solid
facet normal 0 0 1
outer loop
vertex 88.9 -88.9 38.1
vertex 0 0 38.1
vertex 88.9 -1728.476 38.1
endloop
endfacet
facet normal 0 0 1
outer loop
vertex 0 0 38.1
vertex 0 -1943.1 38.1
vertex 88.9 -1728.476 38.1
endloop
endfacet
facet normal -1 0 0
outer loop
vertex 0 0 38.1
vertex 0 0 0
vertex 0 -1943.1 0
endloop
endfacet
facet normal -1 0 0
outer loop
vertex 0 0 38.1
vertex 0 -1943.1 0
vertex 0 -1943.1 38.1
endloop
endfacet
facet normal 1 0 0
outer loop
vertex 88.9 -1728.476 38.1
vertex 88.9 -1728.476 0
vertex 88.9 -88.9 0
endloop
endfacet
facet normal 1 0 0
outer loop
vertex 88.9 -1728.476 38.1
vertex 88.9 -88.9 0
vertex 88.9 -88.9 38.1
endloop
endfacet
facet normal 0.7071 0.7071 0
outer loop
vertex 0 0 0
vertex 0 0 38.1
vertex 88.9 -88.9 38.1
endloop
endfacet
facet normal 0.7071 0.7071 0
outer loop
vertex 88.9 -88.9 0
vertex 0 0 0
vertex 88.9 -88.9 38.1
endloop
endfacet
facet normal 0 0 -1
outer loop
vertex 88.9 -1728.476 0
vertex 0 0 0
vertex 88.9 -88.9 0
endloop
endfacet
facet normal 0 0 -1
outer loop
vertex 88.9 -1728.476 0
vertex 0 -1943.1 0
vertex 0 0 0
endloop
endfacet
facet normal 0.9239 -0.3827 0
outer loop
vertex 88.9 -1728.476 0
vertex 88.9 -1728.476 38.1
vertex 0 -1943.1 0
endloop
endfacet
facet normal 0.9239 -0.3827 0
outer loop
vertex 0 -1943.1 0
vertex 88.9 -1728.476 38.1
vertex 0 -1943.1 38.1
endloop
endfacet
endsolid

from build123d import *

# Parameters (mm, degrees)
F0_W     = 88.9
F0_H     = 38.1
F1_DEPTH = 1943.1
F3_DEPTH = 38.1
F5_DEPTH = 38.1


with BuildPart() as f1:
    # F0 (on Front) → F1 (new body)
    with BuildSketch(Plane.XZ):
        with Locations((44.45, 19.05)):
            Rectangle(F0_W, F0_H)
    extrude(amount=F1_DEPTH)

    # F2 (on face) → F3 (cut, through all)
    with BuildSketch(Plane.XY.offset(38.1)):
        Polygon((88.9, -1728.476414), (0, -1943.1), (88.9, -1943.1), align=None)
    extrude(amount=-F3_DEPTH, mode=Mode.SUBTRACT)

    # F4 (on face) → F5 (cut, through all)
    with BuildSketch(Plane.XY.offset(38.1)):
        Polygon((88.9, 0), (0, 0), (88.9, -88.9), align=None)
    extrude(amount=-F5_DEPTH, mode=Mode.SUBTRACT)


solid = f1.part
